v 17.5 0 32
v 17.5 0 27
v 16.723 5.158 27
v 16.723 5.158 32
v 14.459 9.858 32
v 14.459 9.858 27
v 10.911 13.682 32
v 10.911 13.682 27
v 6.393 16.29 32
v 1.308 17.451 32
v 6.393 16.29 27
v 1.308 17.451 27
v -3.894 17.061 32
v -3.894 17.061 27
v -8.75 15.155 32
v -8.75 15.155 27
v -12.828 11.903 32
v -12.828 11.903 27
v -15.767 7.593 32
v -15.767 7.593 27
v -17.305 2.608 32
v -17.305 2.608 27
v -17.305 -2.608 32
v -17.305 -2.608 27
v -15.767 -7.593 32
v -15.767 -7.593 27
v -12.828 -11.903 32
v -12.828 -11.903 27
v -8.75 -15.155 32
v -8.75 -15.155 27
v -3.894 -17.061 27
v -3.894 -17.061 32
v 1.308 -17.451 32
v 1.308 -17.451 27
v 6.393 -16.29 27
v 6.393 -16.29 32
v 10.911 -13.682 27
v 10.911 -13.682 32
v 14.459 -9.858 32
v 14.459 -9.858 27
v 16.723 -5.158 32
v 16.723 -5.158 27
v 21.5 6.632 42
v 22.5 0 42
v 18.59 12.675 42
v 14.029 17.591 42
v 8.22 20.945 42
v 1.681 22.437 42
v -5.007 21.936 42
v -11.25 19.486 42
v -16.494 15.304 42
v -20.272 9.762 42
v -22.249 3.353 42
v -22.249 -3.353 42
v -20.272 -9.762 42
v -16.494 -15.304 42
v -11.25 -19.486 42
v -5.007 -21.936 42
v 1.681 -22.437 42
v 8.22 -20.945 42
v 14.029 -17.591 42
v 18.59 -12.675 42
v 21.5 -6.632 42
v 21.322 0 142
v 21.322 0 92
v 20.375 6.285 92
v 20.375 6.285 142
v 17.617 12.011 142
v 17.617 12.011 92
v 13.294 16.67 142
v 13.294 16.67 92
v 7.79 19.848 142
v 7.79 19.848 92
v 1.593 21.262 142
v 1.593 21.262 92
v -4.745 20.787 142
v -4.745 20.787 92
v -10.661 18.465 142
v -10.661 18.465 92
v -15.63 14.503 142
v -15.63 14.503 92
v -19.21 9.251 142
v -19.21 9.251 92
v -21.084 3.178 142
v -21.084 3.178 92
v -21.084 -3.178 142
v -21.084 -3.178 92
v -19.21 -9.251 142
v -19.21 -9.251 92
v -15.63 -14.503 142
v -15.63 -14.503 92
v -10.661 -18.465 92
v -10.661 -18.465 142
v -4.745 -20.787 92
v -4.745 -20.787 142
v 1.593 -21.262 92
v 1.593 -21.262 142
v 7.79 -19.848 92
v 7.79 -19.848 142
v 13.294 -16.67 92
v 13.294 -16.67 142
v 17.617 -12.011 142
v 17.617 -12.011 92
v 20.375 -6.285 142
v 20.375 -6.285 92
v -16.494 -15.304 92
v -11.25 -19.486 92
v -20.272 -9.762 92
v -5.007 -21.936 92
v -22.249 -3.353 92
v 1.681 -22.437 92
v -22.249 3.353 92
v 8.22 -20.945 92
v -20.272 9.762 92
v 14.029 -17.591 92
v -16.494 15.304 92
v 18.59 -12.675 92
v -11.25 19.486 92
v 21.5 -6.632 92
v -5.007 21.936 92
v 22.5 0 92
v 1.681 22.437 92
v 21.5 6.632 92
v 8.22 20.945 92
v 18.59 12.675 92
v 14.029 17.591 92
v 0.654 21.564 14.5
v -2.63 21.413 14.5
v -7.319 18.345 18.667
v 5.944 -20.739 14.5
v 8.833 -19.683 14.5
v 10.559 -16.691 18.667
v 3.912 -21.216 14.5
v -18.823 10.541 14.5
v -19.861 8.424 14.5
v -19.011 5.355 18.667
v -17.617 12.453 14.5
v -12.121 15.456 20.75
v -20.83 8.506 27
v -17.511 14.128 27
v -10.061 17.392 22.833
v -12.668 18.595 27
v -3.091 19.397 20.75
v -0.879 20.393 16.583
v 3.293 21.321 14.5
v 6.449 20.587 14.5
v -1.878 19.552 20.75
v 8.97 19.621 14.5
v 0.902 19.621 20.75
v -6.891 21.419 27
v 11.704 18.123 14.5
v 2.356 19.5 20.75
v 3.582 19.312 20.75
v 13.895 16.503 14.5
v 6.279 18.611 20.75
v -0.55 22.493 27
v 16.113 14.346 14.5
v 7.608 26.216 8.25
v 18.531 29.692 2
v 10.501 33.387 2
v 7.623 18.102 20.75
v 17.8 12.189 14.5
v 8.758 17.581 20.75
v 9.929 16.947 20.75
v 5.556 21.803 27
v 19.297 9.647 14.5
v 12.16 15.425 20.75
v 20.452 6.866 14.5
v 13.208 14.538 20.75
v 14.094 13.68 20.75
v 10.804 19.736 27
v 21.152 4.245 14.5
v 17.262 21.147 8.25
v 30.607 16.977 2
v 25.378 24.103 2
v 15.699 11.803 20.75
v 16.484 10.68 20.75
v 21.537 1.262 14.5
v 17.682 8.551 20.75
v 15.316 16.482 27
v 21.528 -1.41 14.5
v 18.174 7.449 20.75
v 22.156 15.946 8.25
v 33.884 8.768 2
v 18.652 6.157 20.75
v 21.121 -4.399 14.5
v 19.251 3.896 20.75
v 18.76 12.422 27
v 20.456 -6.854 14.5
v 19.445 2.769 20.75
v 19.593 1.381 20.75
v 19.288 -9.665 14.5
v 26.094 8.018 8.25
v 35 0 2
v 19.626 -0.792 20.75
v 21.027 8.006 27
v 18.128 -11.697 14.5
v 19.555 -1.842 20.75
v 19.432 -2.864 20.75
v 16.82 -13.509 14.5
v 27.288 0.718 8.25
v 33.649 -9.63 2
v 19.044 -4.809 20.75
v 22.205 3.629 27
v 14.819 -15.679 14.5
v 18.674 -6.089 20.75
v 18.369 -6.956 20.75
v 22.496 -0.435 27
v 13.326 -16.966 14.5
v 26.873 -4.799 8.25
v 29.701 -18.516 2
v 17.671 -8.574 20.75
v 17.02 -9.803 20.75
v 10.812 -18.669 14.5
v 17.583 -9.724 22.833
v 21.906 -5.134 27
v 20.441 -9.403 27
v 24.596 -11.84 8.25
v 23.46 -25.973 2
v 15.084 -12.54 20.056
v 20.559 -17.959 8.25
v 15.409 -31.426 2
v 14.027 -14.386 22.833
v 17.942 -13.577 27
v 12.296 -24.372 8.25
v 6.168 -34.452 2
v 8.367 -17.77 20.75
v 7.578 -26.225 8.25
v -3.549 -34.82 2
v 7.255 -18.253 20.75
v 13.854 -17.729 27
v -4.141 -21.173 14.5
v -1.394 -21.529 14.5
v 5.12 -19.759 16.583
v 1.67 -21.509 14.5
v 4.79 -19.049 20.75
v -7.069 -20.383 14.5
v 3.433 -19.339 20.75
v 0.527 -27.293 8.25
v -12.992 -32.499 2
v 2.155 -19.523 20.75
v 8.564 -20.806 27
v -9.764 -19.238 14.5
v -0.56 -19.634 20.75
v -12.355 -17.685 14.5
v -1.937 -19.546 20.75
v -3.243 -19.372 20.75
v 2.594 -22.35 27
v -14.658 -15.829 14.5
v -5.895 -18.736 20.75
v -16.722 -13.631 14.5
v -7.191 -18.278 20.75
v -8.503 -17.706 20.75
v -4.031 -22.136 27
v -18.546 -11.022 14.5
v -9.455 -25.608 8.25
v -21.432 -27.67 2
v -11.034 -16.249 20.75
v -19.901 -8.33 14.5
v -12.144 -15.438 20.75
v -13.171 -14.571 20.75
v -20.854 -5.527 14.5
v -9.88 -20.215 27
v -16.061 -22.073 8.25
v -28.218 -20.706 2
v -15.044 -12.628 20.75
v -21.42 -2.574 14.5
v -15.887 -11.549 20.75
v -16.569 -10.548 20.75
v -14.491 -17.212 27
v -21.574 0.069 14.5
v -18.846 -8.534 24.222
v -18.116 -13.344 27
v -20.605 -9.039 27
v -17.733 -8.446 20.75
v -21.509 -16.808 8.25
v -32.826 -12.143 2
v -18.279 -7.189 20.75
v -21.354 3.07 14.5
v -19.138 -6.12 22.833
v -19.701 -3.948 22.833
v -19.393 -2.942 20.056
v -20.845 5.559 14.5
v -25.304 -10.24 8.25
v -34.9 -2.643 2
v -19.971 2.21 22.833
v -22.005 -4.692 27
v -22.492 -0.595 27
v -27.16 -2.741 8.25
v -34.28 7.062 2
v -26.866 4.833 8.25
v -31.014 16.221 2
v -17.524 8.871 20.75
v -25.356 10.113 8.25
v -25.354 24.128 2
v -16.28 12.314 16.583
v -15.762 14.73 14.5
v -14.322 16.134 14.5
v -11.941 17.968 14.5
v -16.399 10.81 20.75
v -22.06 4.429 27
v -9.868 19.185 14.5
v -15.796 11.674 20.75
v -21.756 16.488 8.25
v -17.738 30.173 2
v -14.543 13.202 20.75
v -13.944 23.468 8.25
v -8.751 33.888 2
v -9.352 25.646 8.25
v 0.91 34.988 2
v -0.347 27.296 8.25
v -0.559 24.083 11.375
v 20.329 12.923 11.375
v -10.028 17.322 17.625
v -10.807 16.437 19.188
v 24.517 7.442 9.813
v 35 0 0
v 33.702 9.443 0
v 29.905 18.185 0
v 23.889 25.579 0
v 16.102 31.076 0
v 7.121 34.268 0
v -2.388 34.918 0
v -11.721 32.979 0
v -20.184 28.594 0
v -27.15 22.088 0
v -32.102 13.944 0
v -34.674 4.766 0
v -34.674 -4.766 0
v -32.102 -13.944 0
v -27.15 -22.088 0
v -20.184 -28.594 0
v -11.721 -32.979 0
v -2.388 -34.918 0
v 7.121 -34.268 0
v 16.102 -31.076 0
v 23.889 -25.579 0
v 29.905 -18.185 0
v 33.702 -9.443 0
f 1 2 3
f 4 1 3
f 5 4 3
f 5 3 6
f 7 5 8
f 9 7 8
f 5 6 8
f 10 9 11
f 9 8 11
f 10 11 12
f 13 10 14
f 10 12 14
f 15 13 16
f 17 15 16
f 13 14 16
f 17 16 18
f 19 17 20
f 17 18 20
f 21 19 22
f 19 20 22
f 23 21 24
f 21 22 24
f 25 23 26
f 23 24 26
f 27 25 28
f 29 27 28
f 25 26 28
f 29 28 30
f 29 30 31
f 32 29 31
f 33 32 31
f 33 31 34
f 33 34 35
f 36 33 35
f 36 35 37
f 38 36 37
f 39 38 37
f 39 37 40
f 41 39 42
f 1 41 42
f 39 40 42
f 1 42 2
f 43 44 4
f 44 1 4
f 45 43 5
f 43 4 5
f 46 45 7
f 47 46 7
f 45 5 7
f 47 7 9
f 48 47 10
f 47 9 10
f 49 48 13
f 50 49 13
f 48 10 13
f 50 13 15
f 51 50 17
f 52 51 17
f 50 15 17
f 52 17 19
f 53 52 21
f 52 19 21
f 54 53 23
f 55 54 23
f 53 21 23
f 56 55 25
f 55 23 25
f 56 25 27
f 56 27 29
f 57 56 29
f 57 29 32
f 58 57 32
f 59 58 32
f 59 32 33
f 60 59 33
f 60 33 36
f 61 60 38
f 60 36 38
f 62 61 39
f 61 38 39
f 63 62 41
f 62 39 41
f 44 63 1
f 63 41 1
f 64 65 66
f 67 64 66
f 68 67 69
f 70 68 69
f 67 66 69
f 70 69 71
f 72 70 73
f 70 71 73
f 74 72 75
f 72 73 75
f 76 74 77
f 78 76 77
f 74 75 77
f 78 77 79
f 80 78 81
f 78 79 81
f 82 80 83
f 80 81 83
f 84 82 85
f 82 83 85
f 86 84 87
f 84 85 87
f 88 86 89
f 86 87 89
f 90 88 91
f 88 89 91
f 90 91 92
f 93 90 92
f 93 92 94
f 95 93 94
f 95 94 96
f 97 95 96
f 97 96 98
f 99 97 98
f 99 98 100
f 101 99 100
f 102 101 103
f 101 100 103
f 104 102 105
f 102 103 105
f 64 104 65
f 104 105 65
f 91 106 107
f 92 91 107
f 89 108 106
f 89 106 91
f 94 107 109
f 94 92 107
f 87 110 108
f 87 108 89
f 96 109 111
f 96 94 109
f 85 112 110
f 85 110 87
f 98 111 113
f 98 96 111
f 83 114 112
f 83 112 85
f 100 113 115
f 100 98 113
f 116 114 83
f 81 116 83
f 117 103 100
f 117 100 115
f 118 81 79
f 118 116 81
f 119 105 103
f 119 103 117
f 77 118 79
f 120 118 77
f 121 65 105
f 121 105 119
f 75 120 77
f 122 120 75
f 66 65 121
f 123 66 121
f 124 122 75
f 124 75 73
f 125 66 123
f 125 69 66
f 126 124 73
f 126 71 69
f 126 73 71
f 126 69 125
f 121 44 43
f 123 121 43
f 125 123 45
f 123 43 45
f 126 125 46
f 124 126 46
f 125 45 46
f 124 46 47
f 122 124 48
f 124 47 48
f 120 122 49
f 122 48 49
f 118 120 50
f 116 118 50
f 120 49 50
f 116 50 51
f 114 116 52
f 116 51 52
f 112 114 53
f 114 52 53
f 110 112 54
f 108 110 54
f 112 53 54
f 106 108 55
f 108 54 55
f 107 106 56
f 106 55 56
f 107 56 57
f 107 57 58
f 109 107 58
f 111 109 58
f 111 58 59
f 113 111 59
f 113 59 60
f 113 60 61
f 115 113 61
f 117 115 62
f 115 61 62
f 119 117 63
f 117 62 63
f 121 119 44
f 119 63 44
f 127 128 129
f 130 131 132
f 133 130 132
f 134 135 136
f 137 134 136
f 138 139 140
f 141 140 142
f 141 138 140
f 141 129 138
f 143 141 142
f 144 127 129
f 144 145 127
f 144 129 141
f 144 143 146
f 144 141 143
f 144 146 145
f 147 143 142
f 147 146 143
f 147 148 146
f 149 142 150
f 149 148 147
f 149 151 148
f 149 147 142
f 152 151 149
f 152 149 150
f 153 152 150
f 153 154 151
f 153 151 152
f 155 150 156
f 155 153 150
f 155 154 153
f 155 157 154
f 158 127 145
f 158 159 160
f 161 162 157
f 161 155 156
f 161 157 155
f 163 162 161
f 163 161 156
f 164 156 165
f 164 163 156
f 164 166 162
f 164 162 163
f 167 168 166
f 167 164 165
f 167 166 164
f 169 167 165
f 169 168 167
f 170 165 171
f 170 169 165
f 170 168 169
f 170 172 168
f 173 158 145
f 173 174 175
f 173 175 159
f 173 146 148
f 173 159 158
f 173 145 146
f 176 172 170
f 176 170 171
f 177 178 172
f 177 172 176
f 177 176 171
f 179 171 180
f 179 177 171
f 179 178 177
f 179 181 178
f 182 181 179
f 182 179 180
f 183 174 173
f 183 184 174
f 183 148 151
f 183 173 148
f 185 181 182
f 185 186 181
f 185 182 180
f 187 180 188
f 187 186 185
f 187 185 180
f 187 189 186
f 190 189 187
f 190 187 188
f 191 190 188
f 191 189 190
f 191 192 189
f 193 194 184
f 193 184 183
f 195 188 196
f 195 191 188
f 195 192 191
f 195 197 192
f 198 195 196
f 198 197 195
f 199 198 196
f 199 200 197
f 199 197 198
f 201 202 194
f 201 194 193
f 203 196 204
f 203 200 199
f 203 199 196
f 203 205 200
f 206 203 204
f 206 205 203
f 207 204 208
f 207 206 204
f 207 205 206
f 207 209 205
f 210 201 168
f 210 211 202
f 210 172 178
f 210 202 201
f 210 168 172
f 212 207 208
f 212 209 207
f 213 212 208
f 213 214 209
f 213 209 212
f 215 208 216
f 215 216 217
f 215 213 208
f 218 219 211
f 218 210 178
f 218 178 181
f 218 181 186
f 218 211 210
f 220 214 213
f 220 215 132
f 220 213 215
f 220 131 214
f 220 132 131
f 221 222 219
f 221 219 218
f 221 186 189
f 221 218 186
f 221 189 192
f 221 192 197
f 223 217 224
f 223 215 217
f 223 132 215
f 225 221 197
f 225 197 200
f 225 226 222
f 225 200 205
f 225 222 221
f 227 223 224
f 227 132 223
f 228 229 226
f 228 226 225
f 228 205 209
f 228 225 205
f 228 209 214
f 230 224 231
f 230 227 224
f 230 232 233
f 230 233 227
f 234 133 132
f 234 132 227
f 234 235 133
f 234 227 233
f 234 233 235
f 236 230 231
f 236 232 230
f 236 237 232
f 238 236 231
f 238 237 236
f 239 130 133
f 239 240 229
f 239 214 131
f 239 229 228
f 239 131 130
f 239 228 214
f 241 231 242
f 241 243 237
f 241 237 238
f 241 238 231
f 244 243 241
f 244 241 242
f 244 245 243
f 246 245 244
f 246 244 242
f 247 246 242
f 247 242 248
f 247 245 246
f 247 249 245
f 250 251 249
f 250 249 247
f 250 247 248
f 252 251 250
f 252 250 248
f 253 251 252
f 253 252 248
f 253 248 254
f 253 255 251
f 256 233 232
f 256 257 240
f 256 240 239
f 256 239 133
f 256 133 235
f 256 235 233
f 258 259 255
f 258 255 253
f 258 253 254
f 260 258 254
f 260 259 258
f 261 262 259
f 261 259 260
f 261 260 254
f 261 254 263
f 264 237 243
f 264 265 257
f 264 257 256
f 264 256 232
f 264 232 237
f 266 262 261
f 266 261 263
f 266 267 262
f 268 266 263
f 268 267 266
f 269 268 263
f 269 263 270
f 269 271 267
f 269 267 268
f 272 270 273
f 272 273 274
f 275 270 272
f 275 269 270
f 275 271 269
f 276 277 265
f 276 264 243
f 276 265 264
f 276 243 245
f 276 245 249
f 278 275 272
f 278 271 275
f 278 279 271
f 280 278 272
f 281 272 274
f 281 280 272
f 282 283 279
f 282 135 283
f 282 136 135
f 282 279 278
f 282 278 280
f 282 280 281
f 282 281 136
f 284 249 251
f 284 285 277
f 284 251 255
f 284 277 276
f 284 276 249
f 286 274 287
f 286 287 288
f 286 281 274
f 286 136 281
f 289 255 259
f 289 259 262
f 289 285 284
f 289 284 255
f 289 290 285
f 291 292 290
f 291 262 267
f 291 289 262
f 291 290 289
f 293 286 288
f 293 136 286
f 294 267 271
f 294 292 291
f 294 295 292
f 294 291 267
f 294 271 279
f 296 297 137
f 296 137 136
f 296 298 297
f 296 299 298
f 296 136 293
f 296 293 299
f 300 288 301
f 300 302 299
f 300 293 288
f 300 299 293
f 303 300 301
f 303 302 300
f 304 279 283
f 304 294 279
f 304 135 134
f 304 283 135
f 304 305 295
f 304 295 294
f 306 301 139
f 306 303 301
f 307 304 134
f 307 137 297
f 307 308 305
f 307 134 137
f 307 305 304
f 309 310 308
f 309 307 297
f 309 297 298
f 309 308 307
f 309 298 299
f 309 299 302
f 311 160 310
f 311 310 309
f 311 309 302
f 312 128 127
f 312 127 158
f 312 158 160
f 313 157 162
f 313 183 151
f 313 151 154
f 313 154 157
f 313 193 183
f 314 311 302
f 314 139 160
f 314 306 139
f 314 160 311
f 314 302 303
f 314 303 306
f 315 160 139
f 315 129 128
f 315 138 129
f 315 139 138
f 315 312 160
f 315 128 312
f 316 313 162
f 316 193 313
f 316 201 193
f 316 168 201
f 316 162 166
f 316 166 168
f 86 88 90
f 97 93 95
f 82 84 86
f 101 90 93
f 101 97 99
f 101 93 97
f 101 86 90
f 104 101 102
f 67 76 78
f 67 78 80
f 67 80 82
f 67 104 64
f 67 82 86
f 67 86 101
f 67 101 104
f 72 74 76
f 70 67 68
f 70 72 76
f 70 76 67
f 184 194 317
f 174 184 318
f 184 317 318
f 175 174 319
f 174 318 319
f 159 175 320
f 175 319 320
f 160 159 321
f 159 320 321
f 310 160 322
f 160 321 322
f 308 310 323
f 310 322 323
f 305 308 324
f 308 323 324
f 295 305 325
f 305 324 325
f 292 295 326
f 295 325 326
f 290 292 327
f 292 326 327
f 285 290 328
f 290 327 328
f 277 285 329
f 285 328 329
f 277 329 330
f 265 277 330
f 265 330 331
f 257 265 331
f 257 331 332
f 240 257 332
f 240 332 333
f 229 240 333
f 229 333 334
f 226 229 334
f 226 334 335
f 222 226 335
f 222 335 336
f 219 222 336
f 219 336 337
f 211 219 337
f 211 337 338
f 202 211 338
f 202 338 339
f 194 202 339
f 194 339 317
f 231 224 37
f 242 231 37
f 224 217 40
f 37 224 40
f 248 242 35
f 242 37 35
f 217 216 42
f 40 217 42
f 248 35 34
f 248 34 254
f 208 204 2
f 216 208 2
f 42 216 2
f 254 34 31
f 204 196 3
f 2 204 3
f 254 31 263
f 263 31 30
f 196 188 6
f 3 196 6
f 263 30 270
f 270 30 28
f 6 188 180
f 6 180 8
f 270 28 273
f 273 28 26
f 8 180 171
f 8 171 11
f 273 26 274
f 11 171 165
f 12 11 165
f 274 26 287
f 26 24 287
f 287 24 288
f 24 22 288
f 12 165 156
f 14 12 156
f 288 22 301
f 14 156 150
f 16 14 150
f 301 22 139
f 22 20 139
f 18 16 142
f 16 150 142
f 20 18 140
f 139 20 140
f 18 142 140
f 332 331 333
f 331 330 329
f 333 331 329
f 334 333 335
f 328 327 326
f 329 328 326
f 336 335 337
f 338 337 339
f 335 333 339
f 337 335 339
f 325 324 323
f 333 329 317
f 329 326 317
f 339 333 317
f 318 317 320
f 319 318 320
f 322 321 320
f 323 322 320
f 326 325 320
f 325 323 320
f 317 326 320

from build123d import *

# Parameters (mm, degrees)
SKETCH_1_R      = 35
EXTRUDE_1_DEPTH = 2
SKETCH_3_R      = 17.5
EXTRUDE_2_DEPTH = 5
SKETCH_4_R      = 22.5
SKETCH_5_R      = 22.5
EXTRUDE_3_DEPTH = 50
SKETCH_6_R      = 21.322035414
EXTRUDE_4_DEPTH = 50


with BuildPart() as part:
    # 스케치1 → 보스-돌출1 (new body)
    with BuildSketch(Plane.XY):
        Circle(SKETCH_1_R)
    extrude(amount=EXTRUDE_1_DEPTH)

    # 로프트1: read off the stored shape, not the designer's step
    # 로프트1: loft between two sections, ruled curve by curve
    loft_1_from = [
        Edge.make_bspline([(-20.830307169, 8.505780579, 27), (-3.81874601, 50.166394916, 27), (37.841868327, 33.154833758, 27), (20.830307169, -8.505780579, 27), (3.81874601, -50.166394916, 27), (-37.841868327, -33.154833758, 27), (-20.830307169, 8.505780579, 27)], [0, 0, 0, 0, 0.5, 0.5, 0.5, 1, 1, 1, 1], 3, [1, 0.333333333, 0.333333333, 1, 0.333333333, 0.333333333, 1]),
    ]
    loft_1_to = [
        Edge.make_bspline([(10.501396718, 33.38743277, 2), (77.276262258, 12.384639333, 2), (56.273468821, -54.390226207, 2), (-10.501396718, -33.38743277, 2), (-77.276262258, -12.384639333, 2), (-56.273468821, 54.390226207, 2), (10.501396718, 33.38743277, 2)], [0, 0, 0, 0, 0.5, 0.5, 0.5, 1, 1, 1, 1], 3, [1, 0.333333333, 0.333333333, 1, 0.333333333, 0.333333333, 1]),
    ]
    loft_1 = Solid(Shell([*[Face.make_surface_from_curves(loft_1_from[k], loft_1_to[k]) for k in range(1)], Face(Wire(loft_1_from)), Face(Wire(loft_1_to))]))
    add(loft_1)

    # 스케치3 → 보스-돌출2 (add)
    with BuildSketch(Plane.XY.offset(27)):
        Circle(SKETCH_3_R)
    extrude(amount=EXTRUDE_2_DEPTH)

    # 스케치4 → section 0 of loft_2
    with BuildSketch(Plane.XY.offset(42), mode=Mode.PRIVATE) as loft_2_s0:
        Circle(SKETCH_4_R)
    # loft up to a face of the part (loft_2)
    loft([loft_2_s0.sketch, Face(Wire([part.edges().sort_by_distance((-11.979574354, 12.75695098, 32))[0]]))])

    # 스케치5 → 보스-돌출3 (add)
    with BuildSketch(Plane.XY.offset(42)):
        Circle(SKETCH_5_R)
    extrude(amount=EXTRUDE_3_DEPTH)

    # 스케치6 → 보스-돌출4 (add)
    with BuildSketch(Plane.XY.offset(92)):
        Circle(SKETCH_6_R)
    extrude(amount=EXTRUDE_4_DEPTH)


solid = part.part
